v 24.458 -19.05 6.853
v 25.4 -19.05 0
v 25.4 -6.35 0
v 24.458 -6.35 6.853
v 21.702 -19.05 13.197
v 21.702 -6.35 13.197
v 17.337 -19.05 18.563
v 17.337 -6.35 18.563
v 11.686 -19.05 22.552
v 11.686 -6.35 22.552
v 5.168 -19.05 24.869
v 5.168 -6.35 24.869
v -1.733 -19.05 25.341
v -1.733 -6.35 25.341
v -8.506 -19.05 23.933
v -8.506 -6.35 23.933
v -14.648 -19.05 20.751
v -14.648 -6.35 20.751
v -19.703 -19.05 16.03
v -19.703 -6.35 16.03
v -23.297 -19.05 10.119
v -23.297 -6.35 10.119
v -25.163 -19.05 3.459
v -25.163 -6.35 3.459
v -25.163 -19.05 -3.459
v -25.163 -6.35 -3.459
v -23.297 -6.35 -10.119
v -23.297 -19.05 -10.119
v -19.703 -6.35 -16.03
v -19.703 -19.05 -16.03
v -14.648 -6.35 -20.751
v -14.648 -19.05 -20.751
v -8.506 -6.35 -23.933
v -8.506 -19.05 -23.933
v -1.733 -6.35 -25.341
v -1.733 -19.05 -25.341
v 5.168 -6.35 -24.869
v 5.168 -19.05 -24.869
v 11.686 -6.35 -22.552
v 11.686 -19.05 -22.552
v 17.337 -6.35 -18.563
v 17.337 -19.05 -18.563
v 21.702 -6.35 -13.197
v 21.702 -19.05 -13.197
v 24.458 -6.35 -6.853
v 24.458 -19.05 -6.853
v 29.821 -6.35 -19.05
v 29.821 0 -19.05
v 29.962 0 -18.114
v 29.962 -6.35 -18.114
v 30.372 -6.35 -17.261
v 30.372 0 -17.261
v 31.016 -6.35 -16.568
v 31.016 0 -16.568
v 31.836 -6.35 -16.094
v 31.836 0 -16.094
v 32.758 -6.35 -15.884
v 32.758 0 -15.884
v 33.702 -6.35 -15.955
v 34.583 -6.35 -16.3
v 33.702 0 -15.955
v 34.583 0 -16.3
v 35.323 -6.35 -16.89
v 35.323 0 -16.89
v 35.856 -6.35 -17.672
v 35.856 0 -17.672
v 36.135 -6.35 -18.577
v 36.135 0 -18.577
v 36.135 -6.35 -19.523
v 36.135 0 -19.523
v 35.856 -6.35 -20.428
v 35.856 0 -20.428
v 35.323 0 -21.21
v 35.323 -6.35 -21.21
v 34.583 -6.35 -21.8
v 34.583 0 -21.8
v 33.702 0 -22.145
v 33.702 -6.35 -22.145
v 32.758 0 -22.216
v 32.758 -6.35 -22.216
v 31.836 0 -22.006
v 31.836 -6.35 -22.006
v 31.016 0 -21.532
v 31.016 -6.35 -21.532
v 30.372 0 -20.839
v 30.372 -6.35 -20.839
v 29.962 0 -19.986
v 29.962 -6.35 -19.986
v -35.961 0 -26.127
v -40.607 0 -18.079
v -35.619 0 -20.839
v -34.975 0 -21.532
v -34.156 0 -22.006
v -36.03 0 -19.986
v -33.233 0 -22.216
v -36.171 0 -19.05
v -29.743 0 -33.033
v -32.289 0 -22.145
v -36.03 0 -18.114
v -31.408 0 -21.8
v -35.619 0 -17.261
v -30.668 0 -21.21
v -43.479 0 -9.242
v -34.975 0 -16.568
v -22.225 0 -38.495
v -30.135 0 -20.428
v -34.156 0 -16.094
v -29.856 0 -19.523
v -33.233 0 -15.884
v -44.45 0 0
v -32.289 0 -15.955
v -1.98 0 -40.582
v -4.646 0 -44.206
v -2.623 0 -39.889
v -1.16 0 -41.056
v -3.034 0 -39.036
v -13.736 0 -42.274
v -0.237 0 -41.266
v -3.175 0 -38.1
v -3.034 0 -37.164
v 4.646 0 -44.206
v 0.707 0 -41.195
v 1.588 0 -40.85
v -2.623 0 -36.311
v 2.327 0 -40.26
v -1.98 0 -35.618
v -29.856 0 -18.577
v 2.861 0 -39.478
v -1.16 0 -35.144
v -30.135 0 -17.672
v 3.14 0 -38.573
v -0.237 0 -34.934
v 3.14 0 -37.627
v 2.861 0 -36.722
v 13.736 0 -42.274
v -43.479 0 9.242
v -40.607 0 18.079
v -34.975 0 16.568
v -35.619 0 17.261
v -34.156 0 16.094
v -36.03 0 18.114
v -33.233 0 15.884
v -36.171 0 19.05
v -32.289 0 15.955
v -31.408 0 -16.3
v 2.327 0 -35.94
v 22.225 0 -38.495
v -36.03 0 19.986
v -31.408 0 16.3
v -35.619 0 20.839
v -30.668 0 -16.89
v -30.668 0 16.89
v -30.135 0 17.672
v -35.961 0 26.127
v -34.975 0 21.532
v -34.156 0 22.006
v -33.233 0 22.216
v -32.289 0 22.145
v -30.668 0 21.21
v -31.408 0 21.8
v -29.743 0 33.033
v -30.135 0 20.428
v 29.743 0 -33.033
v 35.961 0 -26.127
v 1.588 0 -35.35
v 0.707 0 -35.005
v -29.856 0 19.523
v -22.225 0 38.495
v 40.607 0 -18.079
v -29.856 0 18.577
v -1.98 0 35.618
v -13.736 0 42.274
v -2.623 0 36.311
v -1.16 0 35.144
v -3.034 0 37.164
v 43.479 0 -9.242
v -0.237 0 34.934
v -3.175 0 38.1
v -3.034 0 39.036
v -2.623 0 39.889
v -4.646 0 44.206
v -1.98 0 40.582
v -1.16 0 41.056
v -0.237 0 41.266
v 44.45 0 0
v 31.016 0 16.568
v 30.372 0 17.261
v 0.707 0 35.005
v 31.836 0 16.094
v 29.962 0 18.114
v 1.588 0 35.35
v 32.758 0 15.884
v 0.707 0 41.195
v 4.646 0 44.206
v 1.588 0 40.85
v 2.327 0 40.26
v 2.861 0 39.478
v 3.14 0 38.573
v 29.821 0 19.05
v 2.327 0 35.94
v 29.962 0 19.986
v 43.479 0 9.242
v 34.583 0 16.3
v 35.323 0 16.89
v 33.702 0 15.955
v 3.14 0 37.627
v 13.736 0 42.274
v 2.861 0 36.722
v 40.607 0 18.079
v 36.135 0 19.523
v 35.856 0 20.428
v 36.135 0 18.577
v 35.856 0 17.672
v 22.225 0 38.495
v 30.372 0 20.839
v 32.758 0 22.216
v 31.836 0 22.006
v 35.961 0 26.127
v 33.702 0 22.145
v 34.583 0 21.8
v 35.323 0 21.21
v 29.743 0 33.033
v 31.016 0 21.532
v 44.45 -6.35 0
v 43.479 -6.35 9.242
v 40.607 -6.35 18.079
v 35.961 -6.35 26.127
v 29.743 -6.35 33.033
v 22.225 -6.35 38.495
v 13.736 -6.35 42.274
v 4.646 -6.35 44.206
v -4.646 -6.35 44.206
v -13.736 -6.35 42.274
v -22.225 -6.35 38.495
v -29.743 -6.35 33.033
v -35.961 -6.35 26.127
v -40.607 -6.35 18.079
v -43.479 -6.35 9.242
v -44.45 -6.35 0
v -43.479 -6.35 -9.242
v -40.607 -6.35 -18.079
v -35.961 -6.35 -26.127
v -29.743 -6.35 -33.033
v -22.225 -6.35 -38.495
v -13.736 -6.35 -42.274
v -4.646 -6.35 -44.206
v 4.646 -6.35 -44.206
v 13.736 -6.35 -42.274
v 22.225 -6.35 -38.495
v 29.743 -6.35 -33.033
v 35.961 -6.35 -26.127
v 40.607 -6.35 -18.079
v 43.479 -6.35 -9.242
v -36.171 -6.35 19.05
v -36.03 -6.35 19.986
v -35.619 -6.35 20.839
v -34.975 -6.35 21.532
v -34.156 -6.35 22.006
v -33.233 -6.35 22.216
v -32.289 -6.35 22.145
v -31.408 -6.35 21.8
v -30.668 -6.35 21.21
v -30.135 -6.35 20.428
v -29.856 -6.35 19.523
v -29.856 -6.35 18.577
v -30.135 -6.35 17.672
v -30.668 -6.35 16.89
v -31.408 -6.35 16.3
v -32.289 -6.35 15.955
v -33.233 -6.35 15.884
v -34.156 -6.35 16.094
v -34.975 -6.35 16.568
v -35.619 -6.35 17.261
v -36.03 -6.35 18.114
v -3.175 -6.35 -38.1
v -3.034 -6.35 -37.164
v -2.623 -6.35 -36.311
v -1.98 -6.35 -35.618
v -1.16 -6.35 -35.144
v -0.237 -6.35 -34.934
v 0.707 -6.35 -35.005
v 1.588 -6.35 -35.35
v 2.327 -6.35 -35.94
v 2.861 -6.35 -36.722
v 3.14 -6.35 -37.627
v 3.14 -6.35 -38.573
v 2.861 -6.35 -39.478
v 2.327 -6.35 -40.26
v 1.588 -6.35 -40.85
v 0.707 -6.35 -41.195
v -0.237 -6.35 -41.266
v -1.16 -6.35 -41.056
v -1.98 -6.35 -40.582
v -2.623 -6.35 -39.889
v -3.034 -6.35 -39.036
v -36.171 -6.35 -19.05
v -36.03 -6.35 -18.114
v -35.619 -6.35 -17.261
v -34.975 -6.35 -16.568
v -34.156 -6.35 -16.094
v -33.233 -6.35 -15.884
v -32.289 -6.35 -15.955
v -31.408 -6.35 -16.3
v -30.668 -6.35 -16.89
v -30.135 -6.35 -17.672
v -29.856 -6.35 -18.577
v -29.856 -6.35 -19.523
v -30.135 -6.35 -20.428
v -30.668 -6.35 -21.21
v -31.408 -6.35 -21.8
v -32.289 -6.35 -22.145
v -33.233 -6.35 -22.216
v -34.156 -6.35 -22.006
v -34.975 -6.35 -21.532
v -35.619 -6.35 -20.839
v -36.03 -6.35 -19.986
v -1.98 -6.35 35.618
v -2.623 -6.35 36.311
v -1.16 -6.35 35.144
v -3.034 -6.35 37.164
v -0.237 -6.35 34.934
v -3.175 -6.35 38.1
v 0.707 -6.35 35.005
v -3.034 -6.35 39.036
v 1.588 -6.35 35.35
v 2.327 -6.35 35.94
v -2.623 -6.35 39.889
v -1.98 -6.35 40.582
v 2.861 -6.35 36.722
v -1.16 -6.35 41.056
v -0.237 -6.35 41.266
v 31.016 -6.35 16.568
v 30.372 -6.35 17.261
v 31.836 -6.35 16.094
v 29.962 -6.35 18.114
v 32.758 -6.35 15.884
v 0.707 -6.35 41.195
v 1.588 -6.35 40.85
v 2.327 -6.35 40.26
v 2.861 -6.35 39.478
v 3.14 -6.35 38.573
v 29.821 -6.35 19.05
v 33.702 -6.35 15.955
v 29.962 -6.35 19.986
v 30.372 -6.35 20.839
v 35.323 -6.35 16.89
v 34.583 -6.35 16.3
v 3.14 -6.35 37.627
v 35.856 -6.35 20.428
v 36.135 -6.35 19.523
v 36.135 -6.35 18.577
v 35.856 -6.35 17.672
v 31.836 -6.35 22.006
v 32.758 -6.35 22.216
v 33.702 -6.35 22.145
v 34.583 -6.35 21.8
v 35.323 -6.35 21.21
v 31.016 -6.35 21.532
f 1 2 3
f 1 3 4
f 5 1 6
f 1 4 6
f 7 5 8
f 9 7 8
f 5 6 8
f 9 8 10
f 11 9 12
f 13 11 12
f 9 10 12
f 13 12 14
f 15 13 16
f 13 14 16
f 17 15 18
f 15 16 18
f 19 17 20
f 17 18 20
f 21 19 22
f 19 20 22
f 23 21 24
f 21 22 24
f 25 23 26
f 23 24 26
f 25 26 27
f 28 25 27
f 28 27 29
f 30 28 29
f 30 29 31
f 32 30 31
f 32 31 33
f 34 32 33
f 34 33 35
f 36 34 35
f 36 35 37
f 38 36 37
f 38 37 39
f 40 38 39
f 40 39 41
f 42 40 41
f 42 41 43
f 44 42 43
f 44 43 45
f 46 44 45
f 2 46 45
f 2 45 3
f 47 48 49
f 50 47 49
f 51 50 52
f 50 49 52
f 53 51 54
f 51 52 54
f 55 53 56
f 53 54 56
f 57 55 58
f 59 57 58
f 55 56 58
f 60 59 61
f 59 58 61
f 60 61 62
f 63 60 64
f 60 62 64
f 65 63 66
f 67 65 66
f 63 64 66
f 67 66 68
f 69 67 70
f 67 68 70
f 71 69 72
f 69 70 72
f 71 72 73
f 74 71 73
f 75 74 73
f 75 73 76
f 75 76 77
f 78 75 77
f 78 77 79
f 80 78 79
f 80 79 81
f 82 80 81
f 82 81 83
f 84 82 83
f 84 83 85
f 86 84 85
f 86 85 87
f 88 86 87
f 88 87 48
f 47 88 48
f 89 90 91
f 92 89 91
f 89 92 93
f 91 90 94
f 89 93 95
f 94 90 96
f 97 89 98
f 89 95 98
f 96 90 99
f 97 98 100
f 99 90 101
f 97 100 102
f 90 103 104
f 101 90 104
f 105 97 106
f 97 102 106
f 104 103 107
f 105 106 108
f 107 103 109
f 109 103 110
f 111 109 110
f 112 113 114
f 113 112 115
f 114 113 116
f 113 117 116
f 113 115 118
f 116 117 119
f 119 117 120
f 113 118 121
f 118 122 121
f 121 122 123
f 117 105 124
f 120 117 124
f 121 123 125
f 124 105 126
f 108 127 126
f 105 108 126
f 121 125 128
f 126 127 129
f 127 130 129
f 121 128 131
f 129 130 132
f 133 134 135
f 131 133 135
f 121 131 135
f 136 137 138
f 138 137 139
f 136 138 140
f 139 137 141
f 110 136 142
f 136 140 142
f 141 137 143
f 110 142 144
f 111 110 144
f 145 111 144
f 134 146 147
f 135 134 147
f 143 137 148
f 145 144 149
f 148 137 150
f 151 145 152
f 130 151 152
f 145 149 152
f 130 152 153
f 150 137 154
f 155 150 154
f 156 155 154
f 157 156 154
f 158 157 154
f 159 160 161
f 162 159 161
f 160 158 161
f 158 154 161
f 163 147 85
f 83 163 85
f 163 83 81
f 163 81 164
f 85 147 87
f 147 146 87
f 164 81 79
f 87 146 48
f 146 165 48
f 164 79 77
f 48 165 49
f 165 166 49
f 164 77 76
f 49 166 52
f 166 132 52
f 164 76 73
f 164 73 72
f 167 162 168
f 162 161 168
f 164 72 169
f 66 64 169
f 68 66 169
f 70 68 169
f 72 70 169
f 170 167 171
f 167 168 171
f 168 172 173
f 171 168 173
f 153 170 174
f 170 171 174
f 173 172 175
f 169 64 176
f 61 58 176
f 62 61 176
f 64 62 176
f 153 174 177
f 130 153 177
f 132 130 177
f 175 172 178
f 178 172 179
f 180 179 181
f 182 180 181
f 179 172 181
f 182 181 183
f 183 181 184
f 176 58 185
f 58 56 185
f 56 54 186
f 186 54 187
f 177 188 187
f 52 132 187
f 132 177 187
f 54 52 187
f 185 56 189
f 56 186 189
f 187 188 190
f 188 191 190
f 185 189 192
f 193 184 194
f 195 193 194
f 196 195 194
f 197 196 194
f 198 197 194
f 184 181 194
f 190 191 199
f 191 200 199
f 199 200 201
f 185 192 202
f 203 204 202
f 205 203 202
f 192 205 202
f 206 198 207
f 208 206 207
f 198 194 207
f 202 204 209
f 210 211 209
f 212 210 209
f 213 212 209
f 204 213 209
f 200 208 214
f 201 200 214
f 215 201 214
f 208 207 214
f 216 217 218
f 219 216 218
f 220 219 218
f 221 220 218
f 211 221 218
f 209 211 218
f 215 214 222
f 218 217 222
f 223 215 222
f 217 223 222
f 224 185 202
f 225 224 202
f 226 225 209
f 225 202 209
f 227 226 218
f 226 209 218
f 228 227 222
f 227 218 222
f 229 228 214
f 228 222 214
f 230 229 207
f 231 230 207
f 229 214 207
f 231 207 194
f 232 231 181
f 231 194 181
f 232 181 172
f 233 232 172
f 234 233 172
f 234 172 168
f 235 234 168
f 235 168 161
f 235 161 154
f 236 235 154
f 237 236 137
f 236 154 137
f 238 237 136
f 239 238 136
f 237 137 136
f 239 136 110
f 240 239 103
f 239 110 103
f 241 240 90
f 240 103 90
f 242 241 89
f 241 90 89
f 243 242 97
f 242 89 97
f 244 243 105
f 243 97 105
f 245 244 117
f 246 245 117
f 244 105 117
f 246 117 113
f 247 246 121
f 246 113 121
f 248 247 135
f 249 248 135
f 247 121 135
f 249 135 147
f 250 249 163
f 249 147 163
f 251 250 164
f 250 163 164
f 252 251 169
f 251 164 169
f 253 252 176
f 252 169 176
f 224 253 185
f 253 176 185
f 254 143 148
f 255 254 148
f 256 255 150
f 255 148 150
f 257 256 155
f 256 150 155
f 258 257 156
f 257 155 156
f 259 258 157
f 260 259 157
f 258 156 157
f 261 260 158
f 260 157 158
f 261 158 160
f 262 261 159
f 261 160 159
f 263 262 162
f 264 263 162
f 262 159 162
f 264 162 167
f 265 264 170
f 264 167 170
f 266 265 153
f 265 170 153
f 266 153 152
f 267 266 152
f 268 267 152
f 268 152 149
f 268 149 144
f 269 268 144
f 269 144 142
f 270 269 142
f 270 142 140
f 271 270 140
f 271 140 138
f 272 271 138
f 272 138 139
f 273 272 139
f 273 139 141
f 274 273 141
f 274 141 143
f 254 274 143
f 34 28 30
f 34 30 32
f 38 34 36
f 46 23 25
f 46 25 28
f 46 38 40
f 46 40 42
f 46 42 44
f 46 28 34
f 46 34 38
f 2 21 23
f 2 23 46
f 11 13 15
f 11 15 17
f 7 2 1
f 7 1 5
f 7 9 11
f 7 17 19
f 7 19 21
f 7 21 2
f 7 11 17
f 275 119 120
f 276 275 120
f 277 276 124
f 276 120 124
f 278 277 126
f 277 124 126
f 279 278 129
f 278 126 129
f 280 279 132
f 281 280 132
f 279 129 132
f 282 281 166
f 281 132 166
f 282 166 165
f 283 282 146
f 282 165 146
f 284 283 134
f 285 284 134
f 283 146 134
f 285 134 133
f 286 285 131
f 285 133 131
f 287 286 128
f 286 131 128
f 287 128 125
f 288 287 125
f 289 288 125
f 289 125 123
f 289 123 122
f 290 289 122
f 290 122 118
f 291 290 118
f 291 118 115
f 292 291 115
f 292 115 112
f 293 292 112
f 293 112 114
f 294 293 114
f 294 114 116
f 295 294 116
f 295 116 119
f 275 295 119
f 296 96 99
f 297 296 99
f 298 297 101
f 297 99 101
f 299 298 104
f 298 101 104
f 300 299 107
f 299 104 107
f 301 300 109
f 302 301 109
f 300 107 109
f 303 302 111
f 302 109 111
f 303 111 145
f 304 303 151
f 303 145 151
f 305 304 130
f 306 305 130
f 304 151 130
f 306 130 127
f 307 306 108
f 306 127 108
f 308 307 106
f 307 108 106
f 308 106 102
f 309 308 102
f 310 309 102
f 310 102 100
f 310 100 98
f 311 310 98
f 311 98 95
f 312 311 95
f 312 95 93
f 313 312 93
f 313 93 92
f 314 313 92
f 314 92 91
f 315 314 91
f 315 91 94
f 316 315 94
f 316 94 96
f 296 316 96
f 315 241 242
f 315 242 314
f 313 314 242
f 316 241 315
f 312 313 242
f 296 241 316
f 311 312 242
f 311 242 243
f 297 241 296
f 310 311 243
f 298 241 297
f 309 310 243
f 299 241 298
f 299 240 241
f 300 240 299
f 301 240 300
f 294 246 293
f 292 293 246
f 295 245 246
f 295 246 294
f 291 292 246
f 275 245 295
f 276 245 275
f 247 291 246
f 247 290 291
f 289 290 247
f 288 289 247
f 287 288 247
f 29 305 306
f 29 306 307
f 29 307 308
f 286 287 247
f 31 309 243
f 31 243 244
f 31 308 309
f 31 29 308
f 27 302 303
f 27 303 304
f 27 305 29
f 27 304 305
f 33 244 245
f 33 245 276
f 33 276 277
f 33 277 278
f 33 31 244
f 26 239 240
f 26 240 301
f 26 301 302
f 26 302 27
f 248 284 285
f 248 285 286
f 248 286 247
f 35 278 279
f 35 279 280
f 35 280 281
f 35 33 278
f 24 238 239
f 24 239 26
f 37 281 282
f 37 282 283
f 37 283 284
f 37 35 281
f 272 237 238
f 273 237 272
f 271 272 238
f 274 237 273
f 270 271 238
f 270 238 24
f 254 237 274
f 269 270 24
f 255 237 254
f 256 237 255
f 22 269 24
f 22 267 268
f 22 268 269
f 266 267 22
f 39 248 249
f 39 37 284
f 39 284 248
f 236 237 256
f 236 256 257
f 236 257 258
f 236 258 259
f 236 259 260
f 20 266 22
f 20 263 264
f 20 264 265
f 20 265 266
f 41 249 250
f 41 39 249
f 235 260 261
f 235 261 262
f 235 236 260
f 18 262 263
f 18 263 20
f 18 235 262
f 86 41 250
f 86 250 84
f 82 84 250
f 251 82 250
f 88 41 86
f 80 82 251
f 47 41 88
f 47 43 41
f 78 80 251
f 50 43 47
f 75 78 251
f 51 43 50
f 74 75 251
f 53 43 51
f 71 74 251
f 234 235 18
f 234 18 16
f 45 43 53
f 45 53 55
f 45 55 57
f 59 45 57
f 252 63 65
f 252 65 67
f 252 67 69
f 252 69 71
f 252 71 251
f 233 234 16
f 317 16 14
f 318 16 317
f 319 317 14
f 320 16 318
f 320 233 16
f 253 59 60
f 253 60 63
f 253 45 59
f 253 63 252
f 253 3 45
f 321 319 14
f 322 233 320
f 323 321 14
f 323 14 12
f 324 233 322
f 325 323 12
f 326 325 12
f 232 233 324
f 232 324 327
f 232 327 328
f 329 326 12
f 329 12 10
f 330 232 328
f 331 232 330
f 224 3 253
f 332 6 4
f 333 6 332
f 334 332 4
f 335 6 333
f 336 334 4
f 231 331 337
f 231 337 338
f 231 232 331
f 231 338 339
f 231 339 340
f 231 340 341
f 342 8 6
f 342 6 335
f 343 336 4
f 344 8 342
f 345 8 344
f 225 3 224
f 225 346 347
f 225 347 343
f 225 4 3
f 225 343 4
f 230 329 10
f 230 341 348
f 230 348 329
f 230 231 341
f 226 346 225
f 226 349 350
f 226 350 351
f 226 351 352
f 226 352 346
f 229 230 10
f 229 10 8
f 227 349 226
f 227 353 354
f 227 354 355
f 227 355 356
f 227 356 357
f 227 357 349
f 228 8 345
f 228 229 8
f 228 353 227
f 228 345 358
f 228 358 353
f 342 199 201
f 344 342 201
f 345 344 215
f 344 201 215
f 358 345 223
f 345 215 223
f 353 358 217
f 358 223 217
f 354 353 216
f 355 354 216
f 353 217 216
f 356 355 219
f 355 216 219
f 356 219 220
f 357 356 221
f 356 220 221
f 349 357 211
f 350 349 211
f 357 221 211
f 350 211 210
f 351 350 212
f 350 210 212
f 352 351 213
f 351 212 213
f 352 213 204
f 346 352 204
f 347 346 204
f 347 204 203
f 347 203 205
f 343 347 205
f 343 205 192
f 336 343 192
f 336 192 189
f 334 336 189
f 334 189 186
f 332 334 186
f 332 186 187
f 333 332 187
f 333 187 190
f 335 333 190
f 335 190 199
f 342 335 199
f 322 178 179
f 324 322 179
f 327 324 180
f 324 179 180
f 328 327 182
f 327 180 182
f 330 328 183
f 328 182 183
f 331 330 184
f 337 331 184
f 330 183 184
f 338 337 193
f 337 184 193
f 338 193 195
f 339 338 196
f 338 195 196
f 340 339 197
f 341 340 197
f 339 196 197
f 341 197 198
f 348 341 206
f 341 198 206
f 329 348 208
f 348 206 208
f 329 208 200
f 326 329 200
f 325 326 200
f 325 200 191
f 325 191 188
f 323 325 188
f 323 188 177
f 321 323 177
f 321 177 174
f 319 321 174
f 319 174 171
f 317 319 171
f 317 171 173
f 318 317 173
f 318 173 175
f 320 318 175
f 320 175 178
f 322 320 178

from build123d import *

# Parameters (mm, degrees)
F0_R     = 44.45
F1_DEPTH = 6.35
F2_R     = 25.4
F3_DEPTH = 12.7
F5_R     = 28.575
F5_R_2   = 25.4
F6_DEPTH = 3.175
F7_R     = 3.175
F8_DEPTH = 25.4


with BuildPart() as f1:
    # F0 (on Front) → F1 (new body)
    with BuildSketch(Plane.XZ):
        Circle(F0_R)
    extrude(amount=F1_DEPTH)

    # F2 (on face) → F3 (join)
    with BuildSketch(Plane.XZ.offset(6.35)):
        Circle(F2_R)
    extrude(amount=F3_DEPTH)

    # F5 (on offset) → F6 (cut)
    with BuildSketch(Plane.XZ.offset(12.7)):
        Circle(F5_R)
        Circle(F5_R_2, mode=Mode.SUBTRACT)
    extrude(amount=F6_DEPTH, mode=Mode.SUBTRACT)

    # F7 (on face) → F8 (cut)
    with BuildSketch(Plane(origin=(0, 0, 0), x_dir=(-1, 0, 0), z_dir=(0, 1, 0))):
        with Locations((-32.995568, 19.05)):
            Circle(F7_R)
        with Locations((-32.995568, -19.05)):
            Circle(F7_R)
        with Locations((0, -38.1)):
            Circle(F7_R)
        with Locations((32.995568, -19.05)):
            Circle(F7_R)
        with Locations((32.995568, 19.05)):
            Circle(F7_R)
        with Locations((0, 38.1)):
            Circle(F7_R)
    extrude(amount=-F8_DEPTH, mode=Mode.SUBTRACT)


solid = f1.part
